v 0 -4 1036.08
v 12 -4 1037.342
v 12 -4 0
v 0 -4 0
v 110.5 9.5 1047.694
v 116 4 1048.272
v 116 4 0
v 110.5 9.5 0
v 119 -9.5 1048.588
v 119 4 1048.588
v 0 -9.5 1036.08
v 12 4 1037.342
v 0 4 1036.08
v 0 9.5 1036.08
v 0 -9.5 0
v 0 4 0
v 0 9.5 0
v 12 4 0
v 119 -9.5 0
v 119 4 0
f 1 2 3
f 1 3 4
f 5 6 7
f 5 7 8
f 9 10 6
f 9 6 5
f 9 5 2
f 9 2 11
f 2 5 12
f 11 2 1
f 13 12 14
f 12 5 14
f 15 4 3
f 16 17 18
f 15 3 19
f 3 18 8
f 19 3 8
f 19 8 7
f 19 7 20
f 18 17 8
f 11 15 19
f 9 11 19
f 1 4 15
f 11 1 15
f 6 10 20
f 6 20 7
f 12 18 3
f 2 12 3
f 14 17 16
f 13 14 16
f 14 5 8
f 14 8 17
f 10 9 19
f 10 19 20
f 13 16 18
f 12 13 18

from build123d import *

# Parameters (mm, degrees)
F1_DEPTH = 1100
F3_DEPTH = 19.001
F4_W     = 27
F4_H     = 5.5
F4_W_2   = 10
F5_DEPTH = 1051.4265870314


with BuildPart() as f1:
    # F0 (on Top) → F1 (new body)
    with BuildSketch(Plane.XY):
        Polygon((0, -4), (0, -9.5), (136, -9.5), (136, -4), (146, -4), (146, 4), (116, 4), (110.5, 9.5), (0, 9.5), (0, 4), (12, 4), (12, -4), align=None)
    extrude(amount=F1_DEPTH)

    # F2 (on face) → F3 (cut, through all)
    with BuildSketch(Plane(origin=(0, 9.5, 0), x_dir=(-1, 0, 0), z_dir=(0, 1, 0))):
        Polygon((-110.5, 1100), (-608.1546681334, 1100), (-110.5, 1047.6943866794), align=None)
        Polygon((0, 1100), (0, 1036.0803686826), (819, 950), (819, 1100), align=None)
        Polygon((-110.5, 1100), (-110.5, 1047.6943866794), (0, 1036.0803686826), (0, 1100), align=None)
    extrude(amount=-F3_DEPTH, mode=Mode.SUBTRACT)

    # F4 (on face) → F5 (cut, through all)
    with BuildSketch(Plane(origin=(0, 0, 0), x_dir=(1, 0, 0), z_dir=(0, 0, -1))):
        with Locations((132.5, -6.75)):
            Rectangle(F4_W, F4_H)
        Polygon((136, 9.5), (119, 9.5), (119, -4), (146, -4), (146, 4), (136, 4), align=None)
        with Locations((141, 6.75)):
            Rectangle(F4_W_2, F4_H)
    extrude(amount=-F5_DEPTH, mode=Mode.SUBTRACT)


solid = f1.part
